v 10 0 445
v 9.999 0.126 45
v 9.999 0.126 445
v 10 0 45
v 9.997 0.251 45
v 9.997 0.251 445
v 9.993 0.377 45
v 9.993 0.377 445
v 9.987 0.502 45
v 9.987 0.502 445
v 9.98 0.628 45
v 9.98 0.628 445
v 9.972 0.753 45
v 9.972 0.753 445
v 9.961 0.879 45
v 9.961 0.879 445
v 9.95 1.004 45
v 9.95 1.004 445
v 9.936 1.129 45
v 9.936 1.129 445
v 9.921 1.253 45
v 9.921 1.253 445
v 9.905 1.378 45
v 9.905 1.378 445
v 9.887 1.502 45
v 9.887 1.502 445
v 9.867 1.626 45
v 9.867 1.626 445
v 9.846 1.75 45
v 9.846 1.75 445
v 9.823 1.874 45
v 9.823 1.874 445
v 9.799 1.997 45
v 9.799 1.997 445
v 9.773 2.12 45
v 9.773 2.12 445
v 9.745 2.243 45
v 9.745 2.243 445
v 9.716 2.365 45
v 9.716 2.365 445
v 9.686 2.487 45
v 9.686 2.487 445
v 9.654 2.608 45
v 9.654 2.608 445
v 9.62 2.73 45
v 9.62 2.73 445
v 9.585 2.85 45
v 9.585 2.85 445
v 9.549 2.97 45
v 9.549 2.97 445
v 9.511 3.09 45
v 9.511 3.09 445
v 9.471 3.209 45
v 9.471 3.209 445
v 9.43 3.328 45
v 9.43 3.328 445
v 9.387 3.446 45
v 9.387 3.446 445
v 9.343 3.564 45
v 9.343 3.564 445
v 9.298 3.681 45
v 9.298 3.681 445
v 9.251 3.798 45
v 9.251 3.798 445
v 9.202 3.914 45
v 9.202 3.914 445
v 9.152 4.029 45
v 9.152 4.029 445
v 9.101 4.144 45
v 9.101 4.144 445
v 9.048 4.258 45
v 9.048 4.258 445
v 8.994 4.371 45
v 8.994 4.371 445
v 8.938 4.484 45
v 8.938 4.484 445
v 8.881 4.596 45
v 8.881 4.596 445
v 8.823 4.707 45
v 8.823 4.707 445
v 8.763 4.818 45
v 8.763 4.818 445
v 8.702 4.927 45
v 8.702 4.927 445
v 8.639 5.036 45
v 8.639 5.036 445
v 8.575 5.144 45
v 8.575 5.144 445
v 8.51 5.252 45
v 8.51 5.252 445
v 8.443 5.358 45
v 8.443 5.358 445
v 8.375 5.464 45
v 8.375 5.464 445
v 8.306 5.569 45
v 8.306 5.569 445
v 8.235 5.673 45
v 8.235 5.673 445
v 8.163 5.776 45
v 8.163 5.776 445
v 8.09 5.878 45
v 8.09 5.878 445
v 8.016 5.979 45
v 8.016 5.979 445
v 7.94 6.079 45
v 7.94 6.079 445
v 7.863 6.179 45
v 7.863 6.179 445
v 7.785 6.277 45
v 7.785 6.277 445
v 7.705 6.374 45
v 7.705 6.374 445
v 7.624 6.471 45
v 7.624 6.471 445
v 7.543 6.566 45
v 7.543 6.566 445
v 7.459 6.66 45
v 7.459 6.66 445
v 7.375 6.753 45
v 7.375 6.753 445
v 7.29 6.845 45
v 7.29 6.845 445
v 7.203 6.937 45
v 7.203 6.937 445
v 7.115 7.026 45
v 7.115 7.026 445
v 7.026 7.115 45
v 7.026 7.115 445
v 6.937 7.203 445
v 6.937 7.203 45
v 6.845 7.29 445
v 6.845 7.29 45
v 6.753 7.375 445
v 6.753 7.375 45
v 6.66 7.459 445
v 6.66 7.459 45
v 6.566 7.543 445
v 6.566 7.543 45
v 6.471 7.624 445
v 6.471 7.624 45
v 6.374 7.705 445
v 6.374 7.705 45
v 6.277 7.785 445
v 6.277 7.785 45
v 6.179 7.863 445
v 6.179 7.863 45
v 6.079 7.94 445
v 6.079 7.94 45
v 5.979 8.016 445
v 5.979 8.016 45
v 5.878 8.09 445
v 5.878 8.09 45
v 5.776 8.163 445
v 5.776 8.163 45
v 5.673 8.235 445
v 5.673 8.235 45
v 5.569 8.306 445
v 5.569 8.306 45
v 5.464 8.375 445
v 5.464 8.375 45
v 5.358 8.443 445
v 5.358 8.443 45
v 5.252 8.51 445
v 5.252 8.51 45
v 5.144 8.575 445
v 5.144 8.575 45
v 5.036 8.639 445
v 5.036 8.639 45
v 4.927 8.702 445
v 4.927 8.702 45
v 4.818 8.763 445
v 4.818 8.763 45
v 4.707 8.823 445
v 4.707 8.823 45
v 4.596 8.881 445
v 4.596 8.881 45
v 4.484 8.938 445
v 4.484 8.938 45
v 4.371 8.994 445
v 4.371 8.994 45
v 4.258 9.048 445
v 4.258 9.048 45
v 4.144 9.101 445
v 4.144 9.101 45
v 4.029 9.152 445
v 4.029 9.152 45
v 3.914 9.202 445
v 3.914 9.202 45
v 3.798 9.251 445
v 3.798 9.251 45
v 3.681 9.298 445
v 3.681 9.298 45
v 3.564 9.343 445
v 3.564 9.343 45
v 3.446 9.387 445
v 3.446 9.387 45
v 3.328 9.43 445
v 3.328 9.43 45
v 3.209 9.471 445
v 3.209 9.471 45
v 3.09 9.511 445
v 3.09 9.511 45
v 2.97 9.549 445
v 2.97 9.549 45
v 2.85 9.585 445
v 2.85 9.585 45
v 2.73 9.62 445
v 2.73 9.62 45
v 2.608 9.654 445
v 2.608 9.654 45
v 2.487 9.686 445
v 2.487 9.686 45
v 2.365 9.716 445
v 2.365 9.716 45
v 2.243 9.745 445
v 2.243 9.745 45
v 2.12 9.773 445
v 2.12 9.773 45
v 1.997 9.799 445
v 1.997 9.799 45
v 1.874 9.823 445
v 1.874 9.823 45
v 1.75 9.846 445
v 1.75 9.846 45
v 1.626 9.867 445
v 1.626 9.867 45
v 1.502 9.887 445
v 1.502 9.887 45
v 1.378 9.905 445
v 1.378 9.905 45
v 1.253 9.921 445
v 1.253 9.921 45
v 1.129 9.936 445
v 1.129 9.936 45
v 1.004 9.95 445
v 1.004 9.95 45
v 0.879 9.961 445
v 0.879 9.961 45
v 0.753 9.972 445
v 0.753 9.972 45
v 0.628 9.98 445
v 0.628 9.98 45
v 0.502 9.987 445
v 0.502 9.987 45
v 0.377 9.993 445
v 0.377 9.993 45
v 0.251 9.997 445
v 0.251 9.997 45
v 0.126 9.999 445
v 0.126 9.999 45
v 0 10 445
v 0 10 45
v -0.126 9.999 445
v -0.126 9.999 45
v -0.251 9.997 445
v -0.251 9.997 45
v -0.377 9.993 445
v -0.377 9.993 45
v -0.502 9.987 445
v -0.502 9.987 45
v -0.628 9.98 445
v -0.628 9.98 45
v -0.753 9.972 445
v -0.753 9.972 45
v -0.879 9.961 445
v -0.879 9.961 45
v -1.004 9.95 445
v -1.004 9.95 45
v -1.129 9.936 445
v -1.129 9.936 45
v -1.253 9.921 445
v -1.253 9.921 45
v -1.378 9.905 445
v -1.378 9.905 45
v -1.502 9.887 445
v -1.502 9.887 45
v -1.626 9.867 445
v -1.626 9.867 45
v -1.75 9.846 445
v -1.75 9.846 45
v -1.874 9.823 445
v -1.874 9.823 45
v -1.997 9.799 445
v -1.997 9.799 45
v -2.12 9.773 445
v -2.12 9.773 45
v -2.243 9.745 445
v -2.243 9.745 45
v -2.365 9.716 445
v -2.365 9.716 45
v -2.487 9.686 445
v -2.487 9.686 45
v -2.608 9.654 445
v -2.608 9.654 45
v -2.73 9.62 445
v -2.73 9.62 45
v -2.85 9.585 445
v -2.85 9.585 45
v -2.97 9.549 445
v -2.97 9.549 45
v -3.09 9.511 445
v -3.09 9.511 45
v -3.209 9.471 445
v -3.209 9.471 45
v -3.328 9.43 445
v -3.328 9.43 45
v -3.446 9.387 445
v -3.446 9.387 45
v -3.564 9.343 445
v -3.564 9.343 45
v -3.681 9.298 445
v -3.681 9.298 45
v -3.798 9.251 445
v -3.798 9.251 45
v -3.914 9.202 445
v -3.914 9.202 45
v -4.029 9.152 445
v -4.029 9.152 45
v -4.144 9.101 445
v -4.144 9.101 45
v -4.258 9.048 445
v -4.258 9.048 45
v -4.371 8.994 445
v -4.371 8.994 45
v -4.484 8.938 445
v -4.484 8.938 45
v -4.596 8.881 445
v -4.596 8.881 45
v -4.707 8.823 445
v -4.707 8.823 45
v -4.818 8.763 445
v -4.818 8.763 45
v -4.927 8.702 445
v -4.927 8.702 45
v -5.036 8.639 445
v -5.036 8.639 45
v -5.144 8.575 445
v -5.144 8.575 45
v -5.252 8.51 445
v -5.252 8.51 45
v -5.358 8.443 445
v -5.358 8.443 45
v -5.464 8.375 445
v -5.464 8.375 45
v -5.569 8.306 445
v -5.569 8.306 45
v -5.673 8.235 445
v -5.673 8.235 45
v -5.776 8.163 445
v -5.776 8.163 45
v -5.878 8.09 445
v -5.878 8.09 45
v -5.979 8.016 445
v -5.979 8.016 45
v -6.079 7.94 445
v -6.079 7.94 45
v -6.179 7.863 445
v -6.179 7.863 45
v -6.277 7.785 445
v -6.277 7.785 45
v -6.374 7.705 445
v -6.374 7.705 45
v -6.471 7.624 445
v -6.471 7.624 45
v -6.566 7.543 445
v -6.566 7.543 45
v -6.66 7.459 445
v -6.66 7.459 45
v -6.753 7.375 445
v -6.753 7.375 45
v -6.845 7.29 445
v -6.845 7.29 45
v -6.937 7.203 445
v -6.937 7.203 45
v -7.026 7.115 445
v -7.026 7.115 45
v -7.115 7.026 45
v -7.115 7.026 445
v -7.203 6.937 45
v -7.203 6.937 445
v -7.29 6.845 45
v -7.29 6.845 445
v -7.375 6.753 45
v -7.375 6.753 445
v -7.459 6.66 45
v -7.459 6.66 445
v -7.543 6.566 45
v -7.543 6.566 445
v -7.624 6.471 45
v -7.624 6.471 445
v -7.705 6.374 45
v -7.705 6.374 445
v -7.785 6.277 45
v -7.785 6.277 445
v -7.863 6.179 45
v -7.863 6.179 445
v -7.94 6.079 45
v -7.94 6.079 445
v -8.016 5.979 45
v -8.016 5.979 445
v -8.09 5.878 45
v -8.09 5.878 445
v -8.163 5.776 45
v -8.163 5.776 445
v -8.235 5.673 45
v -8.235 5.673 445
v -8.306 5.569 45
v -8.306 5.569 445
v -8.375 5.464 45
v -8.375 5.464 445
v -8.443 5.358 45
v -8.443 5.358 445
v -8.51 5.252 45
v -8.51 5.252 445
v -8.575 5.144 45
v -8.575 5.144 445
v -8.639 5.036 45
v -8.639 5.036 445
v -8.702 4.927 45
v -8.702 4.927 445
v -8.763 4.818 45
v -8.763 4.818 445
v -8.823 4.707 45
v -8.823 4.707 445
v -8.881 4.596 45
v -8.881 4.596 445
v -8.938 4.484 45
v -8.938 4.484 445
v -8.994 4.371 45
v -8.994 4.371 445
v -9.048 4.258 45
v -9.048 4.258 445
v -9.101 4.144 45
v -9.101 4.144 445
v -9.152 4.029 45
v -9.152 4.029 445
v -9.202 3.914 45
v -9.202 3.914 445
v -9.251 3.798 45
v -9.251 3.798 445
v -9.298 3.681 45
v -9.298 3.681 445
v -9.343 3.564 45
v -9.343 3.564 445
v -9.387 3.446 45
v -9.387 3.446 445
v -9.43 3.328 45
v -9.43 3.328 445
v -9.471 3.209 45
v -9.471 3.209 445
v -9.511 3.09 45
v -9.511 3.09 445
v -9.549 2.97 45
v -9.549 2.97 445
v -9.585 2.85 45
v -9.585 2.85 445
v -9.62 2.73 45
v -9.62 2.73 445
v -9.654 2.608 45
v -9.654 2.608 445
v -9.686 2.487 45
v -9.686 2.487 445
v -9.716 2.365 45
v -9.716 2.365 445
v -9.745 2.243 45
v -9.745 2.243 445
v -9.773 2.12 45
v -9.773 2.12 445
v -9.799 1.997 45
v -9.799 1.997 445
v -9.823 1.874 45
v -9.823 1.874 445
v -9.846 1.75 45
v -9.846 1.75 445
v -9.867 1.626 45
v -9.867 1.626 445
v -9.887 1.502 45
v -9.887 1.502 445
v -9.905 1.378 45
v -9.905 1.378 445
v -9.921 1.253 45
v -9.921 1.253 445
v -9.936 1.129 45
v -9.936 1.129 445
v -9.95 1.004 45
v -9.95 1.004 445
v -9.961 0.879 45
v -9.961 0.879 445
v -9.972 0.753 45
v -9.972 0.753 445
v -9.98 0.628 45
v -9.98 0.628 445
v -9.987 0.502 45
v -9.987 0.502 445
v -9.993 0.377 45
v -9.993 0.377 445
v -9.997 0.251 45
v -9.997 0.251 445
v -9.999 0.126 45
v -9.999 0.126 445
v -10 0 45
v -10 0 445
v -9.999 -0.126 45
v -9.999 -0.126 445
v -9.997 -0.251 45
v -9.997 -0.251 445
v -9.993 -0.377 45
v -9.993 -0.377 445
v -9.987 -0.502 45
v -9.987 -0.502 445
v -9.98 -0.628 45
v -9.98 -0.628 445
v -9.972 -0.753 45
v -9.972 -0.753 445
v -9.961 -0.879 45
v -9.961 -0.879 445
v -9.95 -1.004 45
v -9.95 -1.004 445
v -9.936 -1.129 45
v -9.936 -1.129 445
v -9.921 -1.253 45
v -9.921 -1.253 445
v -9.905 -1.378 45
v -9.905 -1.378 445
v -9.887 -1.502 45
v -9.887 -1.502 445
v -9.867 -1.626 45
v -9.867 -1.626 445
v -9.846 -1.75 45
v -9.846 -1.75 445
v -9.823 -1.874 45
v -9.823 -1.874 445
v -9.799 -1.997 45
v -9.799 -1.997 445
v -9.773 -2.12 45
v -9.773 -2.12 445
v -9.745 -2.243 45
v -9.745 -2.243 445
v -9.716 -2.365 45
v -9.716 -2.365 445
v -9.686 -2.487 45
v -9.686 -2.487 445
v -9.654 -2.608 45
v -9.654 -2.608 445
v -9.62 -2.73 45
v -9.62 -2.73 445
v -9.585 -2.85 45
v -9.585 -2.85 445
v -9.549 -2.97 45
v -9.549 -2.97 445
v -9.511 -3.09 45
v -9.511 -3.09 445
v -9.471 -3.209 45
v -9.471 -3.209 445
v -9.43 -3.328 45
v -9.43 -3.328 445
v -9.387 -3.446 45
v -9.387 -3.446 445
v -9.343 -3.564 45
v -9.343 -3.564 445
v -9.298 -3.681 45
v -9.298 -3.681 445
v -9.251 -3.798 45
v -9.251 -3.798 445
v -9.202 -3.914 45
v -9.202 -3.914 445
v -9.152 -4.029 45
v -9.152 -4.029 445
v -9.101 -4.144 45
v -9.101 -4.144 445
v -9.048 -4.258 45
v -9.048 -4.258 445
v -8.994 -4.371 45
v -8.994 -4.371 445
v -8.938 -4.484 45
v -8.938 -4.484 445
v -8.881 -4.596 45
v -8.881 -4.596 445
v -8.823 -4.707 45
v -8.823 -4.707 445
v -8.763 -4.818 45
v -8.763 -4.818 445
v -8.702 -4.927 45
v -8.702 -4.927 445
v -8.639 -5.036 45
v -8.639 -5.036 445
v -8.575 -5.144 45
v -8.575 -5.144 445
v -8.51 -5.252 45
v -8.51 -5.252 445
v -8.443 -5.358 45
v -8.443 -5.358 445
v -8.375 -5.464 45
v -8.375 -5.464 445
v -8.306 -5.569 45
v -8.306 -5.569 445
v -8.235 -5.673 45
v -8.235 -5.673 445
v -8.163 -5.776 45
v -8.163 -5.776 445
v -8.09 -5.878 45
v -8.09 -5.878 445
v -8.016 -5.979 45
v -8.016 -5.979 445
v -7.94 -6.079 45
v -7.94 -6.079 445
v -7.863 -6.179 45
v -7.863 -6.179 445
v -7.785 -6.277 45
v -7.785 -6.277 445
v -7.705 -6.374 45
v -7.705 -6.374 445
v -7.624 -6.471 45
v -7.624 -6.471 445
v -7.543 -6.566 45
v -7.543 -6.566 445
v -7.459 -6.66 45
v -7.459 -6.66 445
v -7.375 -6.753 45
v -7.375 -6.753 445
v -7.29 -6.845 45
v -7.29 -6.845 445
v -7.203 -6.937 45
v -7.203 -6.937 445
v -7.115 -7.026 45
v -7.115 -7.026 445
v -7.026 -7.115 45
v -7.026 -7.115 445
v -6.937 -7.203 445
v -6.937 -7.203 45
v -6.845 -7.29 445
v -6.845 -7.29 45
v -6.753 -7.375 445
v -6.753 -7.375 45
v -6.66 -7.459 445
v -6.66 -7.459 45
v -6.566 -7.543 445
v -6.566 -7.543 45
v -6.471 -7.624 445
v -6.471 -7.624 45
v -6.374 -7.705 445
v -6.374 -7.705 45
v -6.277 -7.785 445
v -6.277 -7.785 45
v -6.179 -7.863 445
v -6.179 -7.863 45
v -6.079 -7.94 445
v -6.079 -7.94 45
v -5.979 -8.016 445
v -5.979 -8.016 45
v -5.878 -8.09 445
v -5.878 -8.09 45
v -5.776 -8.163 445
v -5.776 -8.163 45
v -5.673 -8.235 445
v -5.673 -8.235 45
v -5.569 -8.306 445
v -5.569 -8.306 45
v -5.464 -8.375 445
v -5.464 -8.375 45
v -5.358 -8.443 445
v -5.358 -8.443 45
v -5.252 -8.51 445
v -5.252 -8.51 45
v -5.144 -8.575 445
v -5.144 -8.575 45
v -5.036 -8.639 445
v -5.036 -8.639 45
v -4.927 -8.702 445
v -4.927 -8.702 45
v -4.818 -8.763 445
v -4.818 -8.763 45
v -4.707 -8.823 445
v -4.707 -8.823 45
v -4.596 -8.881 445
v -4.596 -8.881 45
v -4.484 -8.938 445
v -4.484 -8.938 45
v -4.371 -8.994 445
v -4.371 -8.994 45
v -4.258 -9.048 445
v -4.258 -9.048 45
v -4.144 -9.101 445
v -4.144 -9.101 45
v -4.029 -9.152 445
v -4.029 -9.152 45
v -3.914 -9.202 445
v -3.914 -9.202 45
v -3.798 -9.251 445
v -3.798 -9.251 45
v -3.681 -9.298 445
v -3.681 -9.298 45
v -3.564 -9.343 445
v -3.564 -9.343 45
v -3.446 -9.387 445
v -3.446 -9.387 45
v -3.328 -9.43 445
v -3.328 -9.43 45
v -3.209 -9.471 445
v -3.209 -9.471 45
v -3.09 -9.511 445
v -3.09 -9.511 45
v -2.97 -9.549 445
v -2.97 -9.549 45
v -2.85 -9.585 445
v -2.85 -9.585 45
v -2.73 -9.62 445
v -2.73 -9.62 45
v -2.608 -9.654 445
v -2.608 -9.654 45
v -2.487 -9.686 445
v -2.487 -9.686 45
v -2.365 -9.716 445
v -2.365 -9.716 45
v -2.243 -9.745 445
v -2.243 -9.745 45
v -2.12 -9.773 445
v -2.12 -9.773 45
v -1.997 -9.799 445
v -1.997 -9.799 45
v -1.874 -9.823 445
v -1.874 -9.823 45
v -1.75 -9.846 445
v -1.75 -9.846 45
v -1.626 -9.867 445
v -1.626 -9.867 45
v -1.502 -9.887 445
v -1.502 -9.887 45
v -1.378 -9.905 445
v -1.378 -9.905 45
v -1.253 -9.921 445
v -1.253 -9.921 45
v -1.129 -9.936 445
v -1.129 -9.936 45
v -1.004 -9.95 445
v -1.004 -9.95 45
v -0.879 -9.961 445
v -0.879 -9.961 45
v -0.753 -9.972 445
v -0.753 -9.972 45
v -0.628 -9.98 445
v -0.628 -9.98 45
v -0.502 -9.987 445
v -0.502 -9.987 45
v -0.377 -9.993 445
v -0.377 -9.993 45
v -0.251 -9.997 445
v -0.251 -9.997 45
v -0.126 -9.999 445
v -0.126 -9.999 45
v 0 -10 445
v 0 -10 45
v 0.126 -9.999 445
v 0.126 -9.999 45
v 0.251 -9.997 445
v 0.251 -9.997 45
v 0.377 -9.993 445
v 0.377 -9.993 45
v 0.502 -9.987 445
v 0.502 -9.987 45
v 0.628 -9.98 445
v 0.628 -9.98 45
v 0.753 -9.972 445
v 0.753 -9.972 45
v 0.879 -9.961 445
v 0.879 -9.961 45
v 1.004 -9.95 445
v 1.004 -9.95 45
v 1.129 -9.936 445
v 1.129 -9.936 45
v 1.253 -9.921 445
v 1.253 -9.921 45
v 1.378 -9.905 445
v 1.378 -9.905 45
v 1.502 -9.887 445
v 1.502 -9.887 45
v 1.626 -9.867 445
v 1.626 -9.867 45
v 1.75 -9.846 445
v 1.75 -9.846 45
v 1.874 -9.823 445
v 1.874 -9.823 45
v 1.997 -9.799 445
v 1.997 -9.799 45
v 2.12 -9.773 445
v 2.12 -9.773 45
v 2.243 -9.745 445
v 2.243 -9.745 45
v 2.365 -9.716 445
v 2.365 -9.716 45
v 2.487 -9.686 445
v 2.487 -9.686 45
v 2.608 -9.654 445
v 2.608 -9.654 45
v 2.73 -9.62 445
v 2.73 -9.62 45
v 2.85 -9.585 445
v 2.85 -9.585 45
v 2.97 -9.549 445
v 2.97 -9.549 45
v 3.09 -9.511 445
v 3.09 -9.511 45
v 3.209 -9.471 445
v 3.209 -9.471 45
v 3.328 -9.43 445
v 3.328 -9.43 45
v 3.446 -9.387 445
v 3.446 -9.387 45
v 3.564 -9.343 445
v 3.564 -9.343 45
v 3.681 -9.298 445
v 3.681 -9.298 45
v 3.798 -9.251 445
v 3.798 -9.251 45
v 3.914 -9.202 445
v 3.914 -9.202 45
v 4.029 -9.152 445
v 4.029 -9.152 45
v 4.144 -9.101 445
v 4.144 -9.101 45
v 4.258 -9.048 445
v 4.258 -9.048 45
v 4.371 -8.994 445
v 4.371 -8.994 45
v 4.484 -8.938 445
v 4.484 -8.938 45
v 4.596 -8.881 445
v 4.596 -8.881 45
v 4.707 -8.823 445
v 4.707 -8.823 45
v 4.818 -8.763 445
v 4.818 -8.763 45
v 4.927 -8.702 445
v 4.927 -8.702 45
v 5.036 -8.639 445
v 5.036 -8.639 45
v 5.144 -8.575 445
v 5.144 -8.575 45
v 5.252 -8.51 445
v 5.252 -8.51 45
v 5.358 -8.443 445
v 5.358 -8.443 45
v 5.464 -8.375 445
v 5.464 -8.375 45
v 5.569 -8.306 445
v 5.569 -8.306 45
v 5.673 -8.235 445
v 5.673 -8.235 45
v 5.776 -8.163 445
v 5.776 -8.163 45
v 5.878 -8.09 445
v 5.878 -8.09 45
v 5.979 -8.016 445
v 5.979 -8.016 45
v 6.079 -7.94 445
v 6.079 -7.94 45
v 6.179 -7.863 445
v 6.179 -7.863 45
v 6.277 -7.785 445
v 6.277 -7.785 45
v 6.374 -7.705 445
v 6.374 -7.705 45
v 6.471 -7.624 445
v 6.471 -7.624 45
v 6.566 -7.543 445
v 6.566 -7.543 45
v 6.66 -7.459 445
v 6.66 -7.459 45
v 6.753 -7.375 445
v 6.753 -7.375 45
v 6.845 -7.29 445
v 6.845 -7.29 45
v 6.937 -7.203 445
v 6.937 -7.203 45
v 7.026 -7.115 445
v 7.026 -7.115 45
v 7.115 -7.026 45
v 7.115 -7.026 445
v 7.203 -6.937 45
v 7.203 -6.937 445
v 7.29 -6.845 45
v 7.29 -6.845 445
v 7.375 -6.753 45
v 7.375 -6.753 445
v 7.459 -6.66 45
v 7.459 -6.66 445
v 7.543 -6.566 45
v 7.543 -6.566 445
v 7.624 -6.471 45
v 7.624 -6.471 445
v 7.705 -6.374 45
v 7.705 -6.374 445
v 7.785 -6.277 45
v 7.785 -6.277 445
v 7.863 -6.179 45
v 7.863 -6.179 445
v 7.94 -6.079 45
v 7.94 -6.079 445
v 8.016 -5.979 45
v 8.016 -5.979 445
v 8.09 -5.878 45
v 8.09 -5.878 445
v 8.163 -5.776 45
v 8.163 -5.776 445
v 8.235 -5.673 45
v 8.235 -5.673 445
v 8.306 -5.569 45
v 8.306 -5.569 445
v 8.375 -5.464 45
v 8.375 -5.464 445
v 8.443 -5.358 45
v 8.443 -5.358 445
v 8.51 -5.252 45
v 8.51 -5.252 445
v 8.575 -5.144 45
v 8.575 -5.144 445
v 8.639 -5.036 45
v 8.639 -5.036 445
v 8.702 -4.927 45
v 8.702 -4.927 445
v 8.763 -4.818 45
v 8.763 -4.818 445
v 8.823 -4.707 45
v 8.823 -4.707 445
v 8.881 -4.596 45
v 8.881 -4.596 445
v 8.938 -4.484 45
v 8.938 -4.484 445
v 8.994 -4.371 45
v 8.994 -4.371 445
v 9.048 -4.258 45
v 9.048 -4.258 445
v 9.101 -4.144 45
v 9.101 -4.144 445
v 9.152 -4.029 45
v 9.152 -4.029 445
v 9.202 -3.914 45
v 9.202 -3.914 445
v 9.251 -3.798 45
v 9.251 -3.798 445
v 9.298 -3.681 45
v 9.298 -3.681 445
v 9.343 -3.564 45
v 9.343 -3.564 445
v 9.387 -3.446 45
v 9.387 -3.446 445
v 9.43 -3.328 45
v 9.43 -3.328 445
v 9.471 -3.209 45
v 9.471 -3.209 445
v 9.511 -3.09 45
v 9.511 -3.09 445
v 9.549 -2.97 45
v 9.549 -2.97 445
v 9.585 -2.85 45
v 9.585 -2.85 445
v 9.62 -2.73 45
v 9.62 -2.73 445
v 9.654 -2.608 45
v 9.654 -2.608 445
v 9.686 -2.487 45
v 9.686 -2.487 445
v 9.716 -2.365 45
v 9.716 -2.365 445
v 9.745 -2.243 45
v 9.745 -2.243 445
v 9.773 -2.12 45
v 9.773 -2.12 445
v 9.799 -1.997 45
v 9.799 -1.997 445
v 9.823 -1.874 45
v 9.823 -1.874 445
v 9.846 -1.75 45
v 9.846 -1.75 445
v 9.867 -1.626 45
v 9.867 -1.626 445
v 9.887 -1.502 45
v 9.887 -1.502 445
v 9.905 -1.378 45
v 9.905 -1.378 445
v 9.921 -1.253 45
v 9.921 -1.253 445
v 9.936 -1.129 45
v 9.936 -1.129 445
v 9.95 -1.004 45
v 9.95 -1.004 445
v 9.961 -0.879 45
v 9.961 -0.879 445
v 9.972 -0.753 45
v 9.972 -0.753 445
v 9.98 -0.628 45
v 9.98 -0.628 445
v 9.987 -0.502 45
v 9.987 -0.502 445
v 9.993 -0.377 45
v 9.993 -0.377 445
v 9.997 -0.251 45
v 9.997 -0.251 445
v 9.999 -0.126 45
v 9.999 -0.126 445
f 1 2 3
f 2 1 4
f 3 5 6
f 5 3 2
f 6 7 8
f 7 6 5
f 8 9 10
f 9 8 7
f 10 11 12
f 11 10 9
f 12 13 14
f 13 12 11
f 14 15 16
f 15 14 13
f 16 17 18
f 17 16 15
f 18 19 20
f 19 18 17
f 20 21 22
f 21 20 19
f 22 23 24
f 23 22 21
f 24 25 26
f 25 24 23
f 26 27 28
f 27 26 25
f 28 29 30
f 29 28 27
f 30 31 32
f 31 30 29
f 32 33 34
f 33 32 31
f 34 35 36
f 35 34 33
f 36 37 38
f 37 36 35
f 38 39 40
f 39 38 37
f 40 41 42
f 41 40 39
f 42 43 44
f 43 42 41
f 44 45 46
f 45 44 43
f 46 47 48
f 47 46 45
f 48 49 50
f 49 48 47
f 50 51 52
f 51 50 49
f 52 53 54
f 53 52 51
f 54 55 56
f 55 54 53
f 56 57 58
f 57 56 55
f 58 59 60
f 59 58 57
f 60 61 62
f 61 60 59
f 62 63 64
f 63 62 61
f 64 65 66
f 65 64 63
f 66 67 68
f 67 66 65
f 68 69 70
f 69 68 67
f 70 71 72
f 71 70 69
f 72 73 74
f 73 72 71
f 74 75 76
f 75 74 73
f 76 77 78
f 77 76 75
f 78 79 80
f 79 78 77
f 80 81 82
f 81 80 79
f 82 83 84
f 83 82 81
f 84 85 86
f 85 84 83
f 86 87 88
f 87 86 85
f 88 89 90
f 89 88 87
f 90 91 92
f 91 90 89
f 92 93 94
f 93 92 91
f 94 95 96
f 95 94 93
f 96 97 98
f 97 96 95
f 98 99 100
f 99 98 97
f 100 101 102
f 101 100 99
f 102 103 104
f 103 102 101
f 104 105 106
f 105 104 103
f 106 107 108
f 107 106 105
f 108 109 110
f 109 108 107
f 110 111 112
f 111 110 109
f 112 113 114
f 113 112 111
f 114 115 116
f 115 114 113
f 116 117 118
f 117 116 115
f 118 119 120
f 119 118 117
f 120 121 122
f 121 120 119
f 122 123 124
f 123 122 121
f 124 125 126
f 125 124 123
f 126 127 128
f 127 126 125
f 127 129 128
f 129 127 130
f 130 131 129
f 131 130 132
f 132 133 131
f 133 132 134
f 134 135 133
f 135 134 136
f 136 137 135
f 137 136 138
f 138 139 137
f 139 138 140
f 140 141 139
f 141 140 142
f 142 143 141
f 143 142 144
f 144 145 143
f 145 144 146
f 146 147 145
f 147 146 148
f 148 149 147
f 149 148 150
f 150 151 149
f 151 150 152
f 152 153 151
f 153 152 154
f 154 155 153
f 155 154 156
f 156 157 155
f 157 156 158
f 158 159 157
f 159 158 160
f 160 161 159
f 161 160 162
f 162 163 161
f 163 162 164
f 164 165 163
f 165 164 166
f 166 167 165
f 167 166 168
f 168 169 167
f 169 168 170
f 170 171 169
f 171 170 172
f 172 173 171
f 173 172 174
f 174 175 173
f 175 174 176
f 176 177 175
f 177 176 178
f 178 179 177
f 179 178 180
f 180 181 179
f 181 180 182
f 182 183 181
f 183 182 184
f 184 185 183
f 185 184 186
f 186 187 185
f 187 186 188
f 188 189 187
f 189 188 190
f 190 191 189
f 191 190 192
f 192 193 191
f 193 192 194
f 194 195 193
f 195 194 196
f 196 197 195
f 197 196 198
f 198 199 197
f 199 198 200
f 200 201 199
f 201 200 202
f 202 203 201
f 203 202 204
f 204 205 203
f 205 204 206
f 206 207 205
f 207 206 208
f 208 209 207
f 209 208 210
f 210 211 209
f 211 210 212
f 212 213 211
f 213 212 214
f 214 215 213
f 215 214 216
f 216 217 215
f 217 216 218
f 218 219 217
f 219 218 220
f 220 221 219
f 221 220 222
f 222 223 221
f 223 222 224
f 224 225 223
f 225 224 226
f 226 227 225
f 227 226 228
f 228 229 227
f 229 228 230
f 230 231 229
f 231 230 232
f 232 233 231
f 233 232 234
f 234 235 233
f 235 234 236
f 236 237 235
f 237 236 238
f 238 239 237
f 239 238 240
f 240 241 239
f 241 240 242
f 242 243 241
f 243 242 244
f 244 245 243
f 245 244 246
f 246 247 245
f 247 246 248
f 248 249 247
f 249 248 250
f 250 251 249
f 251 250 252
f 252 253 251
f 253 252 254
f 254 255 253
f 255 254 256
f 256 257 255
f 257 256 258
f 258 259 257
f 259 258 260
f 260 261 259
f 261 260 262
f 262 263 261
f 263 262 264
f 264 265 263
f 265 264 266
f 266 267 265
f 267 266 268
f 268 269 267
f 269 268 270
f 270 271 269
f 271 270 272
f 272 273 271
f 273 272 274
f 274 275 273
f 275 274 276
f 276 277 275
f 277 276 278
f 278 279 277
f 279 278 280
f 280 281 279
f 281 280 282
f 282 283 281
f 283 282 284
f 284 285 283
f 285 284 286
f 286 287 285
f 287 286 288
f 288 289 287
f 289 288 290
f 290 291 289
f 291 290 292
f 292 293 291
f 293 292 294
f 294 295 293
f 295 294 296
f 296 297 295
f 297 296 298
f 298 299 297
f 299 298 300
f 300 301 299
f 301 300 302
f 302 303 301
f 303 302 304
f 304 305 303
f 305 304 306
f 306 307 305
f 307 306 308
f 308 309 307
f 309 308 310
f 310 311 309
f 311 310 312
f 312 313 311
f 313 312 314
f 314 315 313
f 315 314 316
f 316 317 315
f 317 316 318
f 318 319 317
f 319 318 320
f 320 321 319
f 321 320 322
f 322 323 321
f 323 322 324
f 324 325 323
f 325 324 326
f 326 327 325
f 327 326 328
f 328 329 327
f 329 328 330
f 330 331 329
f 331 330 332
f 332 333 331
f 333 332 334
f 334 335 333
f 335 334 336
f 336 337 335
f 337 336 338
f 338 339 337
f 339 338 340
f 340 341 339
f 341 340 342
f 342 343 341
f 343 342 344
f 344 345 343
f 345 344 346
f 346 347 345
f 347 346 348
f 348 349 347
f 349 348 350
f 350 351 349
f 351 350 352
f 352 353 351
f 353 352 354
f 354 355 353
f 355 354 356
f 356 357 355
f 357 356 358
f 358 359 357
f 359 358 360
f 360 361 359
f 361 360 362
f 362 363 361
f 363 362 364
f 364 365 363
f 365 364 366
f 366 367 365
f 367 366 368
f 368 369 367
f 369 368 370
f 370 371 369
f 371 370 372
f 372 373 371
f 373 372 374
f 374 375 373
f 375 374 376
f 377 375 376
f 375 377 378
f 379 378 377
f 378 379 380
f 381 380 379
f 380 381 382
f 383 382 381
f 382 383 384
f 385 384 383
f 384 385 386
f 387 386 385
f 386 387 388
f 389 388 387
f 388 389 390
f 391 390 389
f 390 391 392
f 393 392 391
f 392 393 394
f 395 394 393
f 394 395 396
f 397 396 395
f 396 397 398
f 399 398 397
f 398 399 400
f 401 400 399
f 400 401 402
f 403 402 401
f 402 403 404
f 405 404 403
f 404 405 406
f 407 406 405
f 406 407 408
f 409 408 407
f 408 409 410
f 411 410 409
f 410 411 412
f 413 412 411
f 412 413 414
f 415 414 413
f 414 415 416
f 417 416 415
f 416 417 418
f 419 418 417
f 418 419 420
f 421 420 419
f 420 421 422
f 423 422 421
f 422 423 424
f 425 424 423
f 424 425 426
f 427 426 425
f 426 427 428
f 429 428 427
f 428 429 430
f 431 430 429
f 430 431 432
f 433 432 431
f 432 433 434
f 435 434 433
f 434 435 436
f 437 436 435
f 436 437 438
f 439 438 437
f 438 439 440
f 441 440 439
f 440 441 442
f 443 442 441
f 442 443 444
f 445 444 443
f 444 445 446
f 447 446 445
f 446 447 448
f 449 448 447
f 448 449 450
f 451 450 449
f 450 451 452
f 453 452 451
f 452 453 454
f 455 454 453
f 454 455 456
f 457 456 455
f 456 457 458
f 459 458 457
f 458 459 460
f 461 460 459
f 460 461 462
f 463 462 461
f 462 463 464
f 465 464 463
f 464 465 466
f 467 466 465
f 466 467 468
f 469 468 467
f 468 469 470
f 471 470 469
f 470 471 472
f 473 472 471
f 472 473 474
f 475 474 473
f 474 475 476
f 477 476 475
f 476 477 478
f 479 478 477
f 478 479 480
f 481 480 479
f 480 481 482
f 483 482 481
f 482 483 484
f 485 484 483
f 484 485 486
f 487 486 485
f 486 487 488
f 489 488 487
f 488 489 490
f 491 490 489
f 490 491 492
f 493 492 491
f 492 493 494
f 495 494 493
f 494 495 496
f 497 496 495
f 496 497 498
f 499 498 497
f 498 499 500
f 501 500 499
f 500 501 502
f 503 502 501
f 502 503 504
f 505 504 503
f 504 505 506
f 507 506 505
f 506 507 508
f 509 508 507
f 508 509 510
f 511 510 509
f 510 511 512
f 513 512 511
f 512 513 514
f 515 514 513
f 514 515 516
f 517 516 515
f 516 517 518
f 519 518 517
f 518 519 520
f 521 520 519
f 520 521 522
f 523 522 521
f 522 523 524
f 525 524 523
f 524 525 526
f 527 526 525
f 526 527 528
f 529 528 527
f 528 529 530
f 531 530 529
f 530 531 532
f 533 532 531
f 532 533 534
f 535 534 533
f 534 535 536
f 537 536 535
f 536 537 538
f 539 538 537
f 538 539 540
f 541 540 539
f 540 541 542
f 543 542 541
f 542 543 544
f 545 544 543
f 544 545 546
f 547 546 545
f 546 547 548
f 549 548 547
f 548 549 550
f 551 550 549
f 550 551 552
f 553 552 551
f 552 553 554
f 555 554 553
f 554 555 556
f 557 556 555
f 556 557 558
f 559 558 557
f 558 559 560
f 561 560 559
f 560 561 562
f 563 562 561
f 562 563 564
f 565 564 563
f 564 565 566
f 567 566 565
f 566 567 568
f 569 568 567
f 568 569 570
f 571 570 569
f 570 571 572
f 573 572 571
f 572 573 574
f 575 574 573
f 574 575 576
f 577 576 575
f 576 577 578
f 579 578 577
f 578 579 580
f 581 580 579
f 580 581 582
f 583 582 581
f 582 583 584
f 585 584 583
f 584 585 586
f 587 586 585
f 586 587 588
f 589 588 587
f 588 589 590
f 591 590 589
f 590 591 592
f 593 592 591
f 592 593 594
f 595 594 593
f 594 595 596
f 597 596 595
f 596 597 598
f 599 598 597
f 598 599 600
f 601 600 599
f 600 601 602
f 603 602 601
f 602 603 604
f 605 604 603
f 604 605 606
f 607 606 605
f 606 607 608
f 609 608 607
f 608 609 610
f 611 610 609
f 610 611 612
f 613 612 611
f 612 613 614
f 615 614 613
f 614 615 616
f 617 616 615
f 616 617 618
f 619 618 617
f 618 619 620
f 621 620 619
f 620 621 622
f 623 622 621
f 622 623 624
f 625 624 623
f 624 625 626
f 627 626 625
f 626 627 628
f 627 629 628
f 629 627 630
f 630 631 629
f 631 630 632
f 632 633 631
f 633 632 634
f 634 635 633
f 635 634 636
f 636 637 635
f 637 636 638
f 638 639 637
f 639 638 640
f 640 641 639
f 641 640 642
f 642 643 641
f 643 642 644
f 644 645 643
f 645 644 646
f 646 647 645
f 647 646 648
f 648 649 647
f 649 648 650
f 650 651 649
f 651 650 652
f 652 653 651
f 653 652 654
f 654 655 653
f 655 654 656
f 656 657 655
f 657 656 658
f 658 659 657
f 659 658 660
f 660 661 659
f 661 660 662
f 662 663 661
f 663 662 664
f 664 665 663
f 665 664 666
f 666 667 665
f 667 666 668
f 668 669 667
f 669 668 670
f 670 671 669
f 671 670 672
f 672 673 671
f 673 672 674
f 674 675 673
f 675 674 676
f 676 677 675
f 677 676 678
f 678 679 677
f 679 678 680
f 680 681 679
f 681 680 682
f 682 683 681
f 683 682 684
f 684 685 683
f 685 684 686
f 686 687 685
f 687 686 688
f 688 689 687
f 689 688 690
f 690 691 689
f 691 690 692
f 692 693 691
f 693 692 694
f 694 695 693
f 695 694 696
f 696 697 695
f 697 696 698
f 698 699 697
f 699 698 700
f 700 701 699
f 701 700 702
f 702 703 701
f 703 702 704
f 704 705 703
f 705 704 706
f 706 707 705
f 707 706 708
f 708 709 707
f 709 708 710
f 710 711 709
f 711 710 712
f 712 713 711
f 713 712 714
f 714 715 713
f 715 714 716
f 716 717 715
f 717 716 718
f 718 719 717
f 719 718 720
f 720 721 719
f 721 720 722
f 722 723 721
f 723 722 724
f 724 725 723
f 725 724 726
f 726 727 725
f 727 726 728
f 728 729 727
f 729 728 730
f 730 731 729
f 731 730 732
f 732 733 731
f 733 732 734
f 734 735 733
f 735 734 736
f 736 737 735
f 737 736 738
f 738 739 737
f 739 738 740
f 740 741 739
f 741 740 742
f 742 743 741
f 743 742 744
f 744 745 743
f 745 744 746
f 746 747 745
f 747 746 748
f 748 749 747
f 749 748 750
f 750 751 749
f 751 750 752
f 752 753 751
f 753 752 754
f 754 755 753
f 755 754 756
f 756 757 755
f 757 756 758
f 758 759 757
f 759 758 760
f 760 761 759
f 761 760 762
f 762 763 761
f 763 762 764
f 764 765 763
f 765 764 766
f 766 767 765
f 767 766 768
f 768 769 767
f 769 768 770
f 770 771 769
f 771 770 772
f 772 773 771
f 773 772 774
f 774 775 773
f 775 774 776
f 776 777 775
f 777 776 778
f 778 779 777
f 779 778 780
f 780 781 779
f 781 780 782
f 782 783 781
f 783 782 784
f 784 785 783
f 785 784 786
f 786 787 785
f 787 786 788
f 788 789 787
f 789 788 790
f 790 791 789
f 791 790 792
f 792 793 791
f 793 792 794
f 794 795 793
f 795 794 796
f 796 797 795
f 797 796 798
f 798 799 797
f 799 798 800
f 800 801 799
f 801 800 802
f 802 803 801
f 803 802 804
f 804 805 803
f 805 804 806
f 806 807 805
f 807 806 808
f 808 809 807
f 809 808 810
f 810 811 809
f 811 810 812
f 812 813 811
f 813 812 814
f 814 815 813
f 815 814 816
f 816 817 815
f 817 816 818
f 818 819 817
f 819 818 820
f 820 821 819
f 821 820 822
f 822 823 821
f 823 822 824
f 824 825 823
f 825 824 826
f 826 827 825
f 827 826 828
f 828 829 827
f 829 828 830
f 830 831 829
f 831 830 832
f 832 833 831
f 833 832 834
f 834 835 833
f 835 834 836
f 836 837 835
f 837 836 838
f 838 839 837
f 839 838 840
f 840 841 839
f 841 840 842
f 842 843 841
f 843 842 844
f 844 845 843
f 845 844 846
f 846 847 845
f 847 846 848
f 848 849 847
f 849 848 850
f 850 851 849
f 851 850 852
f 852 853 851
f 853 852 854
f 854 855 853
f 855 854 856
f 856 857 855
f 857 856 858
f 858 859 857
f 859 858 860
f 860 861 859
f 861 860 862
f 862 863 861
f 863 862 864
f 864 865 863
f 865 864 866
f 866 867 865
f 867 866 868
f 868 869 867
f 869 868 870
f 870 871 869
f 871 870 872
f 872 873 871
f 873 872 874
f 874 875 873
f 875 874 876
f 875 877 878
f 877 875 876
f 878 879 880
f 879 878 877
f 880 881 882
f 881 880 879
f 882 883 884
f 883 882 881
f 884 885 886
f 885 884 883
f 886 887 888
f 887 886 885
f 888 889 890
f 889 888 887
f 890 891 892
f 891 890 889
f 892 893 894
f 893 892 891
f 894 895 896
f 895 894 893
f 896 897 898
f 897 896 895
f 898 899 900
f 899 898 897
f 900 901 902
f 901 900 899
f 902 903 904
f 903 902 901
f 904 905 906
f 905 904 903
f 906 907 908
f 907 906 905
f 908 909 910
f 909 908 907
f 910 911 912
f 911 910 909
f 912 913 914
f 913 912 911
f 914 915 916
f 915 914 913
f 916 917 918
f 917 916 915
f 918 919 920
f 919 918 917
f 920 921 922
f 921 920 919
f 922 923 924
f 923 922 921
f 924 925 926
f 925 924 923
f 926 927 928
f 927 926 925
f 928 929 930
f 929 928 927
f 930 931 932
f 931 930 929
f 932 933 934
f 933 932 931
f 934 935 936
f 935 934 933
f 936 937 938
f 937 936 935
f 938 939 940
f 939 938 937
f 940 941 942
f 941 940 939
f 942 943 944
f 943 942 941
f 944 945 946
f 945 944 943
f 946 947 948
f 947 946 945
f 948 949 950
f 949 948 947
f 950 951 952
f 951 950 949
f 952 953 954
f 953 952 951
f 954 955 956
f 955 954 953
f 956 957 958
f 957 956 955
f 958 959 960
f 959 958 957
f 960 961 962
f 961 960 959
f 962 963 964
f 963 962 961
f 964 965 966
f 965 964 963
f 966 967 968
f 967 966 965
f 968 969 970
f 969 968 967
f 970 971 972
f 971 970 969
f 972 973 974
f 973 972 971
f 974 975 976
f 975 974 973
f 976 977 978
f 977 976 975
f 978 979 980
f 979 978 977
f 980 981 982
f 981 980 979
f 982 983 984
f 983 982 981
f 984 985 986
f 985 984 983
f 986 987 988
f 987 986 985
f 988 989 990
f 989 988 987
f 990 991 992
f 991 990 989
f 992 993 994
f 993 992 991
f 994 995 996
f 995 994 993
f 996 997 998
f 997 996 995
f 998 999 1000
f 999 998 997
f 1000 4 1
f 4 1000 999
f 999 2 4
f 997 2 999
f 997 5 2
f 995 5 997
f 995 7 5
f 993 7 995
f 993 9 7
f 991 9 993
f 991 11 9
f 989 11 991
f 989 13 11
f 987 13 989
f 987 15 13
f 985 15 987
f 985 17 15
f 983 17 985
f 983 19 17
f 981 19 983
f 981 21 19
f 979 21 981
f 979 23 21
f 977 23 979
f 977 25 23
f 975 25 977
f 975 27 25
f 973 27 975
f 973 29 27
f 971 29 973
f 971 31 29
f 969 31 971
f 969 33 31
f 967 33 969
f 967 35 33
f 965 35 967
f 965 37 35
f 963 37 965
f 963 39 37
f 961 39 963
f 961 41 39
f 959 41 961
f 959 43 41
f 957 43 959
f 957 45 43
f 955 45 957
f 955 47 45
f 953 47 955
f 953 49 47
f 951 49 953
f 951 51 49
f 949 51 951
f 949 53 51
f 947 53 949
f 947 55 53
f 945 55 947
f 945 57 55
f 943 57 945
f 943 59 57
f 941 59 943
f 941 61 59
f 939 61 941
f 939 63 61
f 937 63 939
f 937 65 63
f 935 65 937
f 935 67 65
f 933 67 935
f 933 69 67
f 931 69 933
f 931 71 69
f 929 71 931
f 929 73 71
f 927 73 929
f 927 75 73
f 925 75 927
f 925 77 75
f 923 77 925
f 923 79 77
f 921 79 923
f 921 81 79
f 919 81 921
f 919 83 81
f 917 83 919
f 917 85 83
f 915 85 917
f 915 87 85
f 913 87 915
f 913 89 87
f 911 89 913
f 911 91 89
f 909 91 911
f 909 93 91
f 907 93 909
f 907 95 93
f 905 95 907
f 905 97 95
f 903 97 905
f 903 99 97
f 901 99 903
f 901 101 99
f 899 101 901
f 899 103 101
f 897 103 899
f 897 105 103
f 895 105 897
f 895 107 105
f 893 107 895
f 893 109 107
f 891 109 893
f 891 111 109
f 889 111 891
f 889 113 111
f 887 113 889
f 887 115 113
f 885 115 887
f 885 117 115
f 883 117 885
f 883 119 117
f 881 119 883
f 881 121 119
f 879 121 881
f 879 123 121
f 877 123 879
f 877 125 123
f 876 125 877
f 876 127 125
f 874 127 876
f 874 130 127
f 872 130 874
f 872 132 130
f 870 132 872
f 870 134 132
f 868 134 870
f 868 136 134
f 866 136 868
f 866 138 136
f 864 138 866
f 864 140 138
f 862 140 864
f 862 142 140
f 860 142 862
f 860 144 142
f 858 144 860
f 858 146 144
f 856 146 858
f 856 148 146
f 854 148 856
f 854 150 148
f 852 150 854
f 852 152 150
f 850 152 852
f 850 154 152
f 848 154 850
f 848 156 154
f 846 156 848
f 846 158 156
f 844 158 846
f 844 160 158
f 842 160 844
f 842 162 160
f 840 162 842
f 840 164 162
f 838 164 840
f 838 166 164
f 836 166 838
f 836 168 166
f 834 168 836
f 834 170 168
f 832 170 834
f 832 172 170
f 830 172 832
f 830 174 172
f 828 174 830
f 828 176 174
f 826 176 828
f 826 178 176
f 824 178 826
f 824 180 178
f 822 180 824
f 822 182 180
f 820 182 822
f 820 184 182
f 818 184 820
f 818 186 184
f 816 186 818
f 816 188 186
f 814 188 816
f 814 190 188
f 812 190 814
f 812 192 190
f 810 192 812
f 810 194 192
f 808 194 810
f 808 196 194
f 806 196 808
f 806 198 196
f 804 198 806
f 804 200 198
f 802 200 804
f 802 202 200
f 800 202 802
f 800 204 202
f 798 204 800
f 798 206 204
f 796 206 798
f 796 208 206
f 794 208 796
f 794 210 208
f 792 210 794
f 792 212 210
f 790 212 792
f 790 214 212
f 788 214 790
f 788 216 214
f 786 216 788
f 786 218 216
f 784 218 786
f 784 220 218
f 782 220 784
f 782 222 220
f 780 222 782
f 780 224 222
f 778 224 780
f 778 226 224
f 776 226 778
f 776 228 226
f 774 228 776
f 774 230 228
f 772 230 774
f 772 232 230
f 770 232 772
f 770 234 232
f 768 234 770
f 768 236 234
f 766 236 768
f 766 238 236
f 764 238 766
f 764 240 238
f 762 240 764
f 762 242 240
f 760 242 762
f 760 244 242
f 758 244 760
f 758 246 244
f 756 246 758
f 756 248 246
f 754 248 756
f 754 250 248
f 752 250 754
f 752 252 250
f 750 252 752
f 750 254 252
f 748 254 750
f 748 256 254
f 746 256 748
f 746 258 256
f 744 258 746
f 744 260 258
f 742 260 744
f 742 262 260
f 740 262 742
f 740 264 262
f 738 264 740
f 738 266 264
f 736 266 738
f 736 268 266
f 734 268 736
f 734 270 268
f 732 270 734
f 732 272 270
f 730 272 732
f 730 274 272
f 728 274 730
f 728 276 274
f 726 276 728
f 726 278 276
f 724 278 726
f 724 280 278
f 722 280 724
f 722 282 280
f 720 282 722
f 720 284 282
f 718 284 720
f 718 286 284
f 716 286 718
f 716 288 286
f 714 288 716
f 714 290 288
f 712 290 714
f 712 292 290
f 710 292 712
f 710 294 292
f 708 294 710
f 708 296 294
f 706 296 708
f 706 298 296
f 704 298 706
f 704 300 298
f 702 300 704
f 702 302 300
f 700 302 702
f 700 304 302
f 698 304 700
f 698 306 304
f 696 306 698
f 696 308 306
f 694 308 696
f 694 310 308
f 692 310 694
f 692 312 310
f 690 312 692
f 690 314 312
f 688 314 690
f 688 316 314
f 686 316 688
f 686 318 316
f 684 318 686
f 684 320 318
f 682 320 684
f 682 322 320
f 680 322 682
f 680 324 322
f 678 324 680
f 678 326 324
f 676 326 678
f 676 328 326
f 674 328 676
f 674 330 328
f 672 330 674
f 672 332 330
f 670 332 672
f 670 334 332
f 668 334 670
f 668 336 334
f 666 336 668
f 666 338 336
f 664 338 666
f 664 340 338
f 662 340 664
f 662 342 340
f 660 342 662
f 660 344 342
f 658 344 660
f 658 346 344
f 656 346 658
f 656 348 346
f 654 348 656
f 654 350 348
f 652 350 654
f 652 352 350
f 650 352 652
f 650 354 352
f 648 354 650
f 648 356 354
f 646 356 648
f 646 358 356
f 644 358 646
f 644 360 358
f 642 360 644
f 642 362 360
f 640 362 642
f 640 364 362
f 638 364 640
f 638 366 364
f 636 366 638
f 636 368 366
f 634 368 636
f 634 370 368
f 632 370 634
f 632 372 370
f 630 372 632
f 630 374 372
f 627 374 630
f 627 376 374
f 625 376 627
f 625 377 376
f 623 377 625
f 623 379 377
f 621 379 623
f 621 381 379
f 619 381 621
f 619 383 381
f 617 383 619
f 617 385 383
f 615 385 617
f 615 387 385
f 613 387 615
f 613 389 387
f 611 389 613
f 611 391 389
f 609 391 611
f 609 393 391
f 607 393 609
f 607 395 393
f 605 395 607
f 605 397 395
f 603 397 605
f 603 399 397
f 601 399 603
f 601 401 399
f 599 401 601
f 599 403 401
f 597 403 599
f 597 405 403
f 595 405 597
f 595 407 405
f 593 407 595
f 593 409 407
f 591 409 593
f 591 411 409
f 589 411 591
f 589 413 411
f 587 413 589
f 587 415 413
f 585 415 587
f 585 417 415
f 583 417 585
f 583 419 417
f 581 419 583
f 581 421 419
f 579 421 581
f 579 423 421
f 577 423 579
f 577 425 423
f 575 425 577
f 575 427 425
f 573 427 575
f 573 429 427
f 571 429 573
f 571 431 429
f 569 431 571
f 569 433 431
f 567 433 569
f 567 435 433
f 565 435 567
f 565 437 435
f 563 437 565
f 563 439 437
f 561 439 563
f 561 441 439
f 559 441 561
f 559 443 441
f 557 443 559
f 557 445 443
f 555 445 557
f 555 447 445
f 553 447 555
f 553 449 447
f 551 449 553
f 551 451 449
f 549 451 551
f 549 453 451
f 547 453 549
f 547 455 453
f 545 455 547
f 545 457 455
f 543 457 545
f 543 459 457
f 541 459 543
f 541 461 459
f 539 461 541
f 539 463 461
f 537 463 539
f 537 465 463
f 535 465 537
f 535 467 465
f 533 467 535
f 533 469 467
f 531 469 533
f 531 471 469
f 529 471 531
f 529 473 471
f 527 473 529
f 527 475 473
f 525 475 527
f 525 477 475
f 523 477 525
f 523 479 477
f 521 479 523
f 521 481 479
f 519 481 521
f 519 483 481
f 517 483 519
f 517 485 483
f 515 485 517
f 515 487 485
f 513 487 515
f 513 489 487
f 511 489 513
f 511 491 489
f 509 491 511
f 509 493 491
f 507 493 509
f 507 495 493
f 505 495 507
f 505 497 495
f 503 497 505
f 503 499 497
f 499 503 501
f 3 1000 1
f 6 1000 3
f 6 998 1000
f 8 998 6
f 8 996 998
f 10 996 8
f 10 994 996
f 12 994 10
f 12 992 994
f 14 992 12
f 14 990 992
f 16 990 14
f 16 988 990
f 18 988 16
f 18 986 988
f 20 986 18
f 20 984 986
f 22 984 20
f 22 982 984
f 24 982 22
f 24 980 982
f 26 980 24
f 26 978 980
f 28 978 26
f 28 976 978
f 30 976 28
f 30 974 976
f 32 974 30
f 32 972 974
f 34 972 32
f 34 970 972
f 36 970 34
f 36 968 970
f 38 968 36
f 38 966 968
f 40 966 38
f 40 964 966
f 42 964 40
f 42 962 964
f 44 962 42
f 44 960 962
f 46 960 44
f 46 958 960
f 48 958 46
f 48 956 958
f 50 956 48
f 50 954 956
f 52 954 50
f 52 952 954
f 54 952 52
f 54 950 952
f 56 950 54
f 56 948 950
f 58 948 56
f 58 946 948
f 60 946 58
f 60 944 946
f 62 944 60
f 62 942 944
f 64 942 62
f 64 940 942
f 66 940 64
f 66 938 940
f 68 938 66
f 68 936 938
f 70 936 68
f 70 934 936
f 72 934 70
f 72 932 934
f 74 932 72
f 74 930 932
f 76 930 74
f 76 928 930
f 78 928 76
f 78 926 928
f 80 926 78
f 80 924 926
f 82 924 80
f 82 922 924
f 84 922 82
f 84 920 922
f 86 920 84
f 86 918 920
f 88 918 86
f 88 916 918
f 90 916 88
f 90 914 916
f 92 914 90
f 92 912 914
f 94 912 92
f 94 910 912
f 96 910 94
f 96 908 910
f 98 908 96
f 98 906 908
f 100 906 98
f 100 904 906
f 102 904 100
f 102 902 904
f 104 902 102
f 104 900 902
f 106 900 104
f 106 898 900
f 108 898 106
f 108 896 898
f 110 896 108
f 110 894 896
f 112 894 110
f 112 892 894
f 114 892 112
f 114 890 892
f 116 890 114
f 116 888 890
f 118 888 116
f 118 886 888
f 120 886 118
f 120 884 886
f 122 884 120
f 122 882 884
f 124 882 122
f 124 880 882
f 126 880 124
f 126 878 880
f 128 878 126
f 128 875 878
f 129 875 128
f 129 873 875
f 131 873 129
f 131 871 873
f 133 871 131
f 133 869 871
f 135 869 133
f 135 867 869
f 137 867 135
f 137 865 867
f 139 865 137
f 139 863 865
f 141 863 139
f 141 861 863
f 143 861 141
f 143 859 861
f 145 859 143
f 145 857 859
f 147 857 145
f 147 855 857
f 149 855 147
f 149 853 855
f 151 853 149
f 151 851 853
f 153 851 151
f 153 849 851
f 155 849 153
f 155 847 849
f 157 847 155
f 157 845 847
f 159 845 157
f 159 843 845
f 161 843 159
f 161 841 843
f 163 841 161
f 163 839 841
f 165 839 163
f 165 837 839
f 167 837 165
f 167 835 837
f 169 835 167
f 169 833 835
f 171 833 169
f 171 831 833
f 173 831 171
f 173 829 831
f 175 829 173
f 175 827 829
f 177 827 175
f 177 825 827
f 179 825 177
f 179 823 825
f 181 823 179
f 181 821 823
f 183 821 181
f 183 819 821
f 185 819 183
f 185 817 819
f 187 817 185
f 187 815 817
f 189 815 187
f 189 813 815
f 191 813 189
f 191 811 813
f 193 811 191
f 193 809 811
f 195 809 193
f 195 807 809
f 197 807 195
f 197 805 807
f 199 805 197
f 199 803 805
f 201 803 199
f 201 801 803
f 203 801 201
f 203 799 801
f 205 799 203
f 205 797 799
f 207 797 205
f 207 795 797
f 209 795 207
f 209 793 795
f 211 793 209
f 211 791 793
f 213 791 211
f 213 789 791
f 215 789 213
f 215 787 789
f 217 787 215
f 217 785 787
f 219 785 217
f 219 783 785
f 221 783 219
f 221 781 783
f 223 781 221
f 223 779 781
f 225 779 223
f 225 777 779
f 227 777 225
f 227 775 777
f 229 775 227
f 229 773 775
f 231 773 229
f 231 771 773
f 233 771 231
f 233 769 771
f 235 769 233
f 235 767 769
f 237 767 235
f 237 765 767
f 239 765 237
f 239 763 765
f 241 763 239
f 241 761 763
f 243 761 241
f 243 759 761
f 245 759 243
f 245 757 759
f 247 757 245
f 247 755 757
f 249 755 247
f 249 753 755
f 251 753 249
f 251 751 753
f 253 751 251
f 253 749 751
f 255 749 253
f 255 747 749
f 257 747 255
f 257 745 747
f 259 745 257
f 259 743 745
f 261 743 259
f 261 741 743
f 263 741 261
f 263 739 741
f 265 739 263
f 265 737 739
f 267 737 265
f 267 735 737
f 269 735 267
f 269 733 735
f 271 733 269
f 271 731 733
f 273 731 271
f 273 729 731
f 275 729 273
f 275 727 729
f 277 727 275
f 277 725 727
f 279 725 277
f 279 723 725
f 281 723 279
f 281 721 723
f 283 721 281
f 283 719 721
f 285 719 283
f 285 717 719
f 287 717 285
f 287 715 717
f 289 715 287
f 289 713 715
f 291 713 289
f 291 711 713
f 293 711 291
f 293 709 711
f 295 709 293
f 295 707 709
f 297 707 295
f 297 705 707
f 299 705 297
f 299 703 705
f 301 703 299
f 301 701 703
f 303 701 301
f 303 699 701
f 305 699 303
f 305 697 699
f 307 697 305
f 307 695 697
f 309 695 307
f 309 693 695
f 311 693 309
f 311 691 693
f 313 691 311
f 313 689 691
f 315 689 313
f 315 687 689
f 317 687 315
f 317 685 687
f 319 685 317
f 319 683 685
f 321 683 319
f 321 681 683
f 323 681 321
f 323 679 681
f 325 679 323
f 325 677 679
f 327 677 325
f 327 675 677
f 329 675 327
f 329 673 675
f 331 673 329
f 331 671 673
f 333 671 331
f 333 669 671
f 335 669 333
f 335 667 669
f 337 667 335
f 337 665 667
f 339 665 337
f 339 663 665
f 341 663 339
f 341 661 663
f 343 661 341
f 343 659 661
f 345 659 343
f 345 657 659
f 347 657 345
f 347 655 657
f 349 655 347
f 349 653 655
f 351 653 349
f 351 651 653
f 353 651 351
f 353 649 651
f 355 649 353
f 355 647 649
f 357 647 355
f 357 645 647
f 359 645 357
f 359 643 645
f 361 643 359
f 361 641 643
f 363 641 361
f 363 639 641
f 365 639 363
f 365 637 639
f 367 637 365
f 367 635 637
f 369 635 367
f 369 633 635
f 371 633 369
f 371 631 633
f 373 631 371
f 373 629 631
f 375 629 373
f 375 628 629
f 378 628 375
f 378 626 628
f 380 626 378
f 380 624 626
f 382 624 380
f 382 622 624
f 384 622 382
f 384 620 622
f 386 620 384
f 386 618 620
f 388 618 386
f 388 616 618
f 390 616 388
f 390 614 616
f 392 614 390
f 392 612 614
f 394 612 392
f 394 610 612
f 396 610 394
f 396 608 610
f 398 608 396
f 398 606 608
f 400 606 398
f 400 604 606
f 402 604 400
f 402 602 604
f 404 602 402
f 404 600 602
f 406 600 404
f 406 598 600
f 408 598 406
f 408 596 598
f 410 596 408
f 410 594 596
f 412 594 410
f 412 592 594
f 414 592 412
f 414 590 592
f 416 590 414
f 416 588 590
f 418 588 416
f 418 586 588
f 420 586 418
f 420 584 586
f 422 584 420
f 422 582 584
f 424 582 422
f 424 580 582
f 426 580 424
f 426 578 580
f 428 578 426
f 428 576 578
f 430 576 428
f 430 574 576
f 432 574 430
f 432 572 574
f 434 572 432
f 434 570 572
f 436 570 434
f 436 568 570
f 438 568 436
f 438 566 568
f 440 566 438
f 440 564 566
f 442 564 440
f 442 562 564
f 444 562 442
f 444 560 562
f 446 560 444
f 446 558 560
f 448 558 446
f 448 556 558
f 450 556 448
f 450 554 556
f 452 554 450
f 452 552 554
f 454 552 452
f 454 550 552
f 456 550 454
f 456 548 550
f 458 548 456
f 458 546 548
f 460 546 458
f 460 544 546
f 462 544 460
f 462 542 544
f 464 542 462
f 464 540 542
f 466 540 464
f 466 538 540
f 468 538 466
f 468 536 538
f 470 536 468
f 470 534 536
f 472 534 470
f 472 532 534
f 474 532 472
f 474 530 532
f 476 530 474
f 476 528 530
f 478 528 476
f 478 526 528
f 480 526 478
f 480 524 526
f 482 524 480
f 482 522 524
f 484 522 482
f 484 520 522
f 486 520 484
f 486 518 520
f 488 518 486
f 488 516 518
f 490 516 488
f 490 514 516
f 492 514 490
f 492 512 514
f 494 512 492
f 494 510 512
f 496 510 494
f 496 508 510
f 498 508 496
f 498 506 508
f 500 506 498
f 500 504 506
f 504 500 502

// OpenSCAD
/*
    Stirred-Tank Simulation
    Copyright (c) 2021 FelixFebrian

    File shaft.scad
*/

// User Settings
$fn = 500;

shaftDiameter = 20;
shaftHeight = 400;

zTranslation = 320 - 400 + 125;

module shaft() {
    translate([0, 0, zTranslation])
        cylinder(d=shaftDiameter, h=shaftHeight);
}

shaft();
